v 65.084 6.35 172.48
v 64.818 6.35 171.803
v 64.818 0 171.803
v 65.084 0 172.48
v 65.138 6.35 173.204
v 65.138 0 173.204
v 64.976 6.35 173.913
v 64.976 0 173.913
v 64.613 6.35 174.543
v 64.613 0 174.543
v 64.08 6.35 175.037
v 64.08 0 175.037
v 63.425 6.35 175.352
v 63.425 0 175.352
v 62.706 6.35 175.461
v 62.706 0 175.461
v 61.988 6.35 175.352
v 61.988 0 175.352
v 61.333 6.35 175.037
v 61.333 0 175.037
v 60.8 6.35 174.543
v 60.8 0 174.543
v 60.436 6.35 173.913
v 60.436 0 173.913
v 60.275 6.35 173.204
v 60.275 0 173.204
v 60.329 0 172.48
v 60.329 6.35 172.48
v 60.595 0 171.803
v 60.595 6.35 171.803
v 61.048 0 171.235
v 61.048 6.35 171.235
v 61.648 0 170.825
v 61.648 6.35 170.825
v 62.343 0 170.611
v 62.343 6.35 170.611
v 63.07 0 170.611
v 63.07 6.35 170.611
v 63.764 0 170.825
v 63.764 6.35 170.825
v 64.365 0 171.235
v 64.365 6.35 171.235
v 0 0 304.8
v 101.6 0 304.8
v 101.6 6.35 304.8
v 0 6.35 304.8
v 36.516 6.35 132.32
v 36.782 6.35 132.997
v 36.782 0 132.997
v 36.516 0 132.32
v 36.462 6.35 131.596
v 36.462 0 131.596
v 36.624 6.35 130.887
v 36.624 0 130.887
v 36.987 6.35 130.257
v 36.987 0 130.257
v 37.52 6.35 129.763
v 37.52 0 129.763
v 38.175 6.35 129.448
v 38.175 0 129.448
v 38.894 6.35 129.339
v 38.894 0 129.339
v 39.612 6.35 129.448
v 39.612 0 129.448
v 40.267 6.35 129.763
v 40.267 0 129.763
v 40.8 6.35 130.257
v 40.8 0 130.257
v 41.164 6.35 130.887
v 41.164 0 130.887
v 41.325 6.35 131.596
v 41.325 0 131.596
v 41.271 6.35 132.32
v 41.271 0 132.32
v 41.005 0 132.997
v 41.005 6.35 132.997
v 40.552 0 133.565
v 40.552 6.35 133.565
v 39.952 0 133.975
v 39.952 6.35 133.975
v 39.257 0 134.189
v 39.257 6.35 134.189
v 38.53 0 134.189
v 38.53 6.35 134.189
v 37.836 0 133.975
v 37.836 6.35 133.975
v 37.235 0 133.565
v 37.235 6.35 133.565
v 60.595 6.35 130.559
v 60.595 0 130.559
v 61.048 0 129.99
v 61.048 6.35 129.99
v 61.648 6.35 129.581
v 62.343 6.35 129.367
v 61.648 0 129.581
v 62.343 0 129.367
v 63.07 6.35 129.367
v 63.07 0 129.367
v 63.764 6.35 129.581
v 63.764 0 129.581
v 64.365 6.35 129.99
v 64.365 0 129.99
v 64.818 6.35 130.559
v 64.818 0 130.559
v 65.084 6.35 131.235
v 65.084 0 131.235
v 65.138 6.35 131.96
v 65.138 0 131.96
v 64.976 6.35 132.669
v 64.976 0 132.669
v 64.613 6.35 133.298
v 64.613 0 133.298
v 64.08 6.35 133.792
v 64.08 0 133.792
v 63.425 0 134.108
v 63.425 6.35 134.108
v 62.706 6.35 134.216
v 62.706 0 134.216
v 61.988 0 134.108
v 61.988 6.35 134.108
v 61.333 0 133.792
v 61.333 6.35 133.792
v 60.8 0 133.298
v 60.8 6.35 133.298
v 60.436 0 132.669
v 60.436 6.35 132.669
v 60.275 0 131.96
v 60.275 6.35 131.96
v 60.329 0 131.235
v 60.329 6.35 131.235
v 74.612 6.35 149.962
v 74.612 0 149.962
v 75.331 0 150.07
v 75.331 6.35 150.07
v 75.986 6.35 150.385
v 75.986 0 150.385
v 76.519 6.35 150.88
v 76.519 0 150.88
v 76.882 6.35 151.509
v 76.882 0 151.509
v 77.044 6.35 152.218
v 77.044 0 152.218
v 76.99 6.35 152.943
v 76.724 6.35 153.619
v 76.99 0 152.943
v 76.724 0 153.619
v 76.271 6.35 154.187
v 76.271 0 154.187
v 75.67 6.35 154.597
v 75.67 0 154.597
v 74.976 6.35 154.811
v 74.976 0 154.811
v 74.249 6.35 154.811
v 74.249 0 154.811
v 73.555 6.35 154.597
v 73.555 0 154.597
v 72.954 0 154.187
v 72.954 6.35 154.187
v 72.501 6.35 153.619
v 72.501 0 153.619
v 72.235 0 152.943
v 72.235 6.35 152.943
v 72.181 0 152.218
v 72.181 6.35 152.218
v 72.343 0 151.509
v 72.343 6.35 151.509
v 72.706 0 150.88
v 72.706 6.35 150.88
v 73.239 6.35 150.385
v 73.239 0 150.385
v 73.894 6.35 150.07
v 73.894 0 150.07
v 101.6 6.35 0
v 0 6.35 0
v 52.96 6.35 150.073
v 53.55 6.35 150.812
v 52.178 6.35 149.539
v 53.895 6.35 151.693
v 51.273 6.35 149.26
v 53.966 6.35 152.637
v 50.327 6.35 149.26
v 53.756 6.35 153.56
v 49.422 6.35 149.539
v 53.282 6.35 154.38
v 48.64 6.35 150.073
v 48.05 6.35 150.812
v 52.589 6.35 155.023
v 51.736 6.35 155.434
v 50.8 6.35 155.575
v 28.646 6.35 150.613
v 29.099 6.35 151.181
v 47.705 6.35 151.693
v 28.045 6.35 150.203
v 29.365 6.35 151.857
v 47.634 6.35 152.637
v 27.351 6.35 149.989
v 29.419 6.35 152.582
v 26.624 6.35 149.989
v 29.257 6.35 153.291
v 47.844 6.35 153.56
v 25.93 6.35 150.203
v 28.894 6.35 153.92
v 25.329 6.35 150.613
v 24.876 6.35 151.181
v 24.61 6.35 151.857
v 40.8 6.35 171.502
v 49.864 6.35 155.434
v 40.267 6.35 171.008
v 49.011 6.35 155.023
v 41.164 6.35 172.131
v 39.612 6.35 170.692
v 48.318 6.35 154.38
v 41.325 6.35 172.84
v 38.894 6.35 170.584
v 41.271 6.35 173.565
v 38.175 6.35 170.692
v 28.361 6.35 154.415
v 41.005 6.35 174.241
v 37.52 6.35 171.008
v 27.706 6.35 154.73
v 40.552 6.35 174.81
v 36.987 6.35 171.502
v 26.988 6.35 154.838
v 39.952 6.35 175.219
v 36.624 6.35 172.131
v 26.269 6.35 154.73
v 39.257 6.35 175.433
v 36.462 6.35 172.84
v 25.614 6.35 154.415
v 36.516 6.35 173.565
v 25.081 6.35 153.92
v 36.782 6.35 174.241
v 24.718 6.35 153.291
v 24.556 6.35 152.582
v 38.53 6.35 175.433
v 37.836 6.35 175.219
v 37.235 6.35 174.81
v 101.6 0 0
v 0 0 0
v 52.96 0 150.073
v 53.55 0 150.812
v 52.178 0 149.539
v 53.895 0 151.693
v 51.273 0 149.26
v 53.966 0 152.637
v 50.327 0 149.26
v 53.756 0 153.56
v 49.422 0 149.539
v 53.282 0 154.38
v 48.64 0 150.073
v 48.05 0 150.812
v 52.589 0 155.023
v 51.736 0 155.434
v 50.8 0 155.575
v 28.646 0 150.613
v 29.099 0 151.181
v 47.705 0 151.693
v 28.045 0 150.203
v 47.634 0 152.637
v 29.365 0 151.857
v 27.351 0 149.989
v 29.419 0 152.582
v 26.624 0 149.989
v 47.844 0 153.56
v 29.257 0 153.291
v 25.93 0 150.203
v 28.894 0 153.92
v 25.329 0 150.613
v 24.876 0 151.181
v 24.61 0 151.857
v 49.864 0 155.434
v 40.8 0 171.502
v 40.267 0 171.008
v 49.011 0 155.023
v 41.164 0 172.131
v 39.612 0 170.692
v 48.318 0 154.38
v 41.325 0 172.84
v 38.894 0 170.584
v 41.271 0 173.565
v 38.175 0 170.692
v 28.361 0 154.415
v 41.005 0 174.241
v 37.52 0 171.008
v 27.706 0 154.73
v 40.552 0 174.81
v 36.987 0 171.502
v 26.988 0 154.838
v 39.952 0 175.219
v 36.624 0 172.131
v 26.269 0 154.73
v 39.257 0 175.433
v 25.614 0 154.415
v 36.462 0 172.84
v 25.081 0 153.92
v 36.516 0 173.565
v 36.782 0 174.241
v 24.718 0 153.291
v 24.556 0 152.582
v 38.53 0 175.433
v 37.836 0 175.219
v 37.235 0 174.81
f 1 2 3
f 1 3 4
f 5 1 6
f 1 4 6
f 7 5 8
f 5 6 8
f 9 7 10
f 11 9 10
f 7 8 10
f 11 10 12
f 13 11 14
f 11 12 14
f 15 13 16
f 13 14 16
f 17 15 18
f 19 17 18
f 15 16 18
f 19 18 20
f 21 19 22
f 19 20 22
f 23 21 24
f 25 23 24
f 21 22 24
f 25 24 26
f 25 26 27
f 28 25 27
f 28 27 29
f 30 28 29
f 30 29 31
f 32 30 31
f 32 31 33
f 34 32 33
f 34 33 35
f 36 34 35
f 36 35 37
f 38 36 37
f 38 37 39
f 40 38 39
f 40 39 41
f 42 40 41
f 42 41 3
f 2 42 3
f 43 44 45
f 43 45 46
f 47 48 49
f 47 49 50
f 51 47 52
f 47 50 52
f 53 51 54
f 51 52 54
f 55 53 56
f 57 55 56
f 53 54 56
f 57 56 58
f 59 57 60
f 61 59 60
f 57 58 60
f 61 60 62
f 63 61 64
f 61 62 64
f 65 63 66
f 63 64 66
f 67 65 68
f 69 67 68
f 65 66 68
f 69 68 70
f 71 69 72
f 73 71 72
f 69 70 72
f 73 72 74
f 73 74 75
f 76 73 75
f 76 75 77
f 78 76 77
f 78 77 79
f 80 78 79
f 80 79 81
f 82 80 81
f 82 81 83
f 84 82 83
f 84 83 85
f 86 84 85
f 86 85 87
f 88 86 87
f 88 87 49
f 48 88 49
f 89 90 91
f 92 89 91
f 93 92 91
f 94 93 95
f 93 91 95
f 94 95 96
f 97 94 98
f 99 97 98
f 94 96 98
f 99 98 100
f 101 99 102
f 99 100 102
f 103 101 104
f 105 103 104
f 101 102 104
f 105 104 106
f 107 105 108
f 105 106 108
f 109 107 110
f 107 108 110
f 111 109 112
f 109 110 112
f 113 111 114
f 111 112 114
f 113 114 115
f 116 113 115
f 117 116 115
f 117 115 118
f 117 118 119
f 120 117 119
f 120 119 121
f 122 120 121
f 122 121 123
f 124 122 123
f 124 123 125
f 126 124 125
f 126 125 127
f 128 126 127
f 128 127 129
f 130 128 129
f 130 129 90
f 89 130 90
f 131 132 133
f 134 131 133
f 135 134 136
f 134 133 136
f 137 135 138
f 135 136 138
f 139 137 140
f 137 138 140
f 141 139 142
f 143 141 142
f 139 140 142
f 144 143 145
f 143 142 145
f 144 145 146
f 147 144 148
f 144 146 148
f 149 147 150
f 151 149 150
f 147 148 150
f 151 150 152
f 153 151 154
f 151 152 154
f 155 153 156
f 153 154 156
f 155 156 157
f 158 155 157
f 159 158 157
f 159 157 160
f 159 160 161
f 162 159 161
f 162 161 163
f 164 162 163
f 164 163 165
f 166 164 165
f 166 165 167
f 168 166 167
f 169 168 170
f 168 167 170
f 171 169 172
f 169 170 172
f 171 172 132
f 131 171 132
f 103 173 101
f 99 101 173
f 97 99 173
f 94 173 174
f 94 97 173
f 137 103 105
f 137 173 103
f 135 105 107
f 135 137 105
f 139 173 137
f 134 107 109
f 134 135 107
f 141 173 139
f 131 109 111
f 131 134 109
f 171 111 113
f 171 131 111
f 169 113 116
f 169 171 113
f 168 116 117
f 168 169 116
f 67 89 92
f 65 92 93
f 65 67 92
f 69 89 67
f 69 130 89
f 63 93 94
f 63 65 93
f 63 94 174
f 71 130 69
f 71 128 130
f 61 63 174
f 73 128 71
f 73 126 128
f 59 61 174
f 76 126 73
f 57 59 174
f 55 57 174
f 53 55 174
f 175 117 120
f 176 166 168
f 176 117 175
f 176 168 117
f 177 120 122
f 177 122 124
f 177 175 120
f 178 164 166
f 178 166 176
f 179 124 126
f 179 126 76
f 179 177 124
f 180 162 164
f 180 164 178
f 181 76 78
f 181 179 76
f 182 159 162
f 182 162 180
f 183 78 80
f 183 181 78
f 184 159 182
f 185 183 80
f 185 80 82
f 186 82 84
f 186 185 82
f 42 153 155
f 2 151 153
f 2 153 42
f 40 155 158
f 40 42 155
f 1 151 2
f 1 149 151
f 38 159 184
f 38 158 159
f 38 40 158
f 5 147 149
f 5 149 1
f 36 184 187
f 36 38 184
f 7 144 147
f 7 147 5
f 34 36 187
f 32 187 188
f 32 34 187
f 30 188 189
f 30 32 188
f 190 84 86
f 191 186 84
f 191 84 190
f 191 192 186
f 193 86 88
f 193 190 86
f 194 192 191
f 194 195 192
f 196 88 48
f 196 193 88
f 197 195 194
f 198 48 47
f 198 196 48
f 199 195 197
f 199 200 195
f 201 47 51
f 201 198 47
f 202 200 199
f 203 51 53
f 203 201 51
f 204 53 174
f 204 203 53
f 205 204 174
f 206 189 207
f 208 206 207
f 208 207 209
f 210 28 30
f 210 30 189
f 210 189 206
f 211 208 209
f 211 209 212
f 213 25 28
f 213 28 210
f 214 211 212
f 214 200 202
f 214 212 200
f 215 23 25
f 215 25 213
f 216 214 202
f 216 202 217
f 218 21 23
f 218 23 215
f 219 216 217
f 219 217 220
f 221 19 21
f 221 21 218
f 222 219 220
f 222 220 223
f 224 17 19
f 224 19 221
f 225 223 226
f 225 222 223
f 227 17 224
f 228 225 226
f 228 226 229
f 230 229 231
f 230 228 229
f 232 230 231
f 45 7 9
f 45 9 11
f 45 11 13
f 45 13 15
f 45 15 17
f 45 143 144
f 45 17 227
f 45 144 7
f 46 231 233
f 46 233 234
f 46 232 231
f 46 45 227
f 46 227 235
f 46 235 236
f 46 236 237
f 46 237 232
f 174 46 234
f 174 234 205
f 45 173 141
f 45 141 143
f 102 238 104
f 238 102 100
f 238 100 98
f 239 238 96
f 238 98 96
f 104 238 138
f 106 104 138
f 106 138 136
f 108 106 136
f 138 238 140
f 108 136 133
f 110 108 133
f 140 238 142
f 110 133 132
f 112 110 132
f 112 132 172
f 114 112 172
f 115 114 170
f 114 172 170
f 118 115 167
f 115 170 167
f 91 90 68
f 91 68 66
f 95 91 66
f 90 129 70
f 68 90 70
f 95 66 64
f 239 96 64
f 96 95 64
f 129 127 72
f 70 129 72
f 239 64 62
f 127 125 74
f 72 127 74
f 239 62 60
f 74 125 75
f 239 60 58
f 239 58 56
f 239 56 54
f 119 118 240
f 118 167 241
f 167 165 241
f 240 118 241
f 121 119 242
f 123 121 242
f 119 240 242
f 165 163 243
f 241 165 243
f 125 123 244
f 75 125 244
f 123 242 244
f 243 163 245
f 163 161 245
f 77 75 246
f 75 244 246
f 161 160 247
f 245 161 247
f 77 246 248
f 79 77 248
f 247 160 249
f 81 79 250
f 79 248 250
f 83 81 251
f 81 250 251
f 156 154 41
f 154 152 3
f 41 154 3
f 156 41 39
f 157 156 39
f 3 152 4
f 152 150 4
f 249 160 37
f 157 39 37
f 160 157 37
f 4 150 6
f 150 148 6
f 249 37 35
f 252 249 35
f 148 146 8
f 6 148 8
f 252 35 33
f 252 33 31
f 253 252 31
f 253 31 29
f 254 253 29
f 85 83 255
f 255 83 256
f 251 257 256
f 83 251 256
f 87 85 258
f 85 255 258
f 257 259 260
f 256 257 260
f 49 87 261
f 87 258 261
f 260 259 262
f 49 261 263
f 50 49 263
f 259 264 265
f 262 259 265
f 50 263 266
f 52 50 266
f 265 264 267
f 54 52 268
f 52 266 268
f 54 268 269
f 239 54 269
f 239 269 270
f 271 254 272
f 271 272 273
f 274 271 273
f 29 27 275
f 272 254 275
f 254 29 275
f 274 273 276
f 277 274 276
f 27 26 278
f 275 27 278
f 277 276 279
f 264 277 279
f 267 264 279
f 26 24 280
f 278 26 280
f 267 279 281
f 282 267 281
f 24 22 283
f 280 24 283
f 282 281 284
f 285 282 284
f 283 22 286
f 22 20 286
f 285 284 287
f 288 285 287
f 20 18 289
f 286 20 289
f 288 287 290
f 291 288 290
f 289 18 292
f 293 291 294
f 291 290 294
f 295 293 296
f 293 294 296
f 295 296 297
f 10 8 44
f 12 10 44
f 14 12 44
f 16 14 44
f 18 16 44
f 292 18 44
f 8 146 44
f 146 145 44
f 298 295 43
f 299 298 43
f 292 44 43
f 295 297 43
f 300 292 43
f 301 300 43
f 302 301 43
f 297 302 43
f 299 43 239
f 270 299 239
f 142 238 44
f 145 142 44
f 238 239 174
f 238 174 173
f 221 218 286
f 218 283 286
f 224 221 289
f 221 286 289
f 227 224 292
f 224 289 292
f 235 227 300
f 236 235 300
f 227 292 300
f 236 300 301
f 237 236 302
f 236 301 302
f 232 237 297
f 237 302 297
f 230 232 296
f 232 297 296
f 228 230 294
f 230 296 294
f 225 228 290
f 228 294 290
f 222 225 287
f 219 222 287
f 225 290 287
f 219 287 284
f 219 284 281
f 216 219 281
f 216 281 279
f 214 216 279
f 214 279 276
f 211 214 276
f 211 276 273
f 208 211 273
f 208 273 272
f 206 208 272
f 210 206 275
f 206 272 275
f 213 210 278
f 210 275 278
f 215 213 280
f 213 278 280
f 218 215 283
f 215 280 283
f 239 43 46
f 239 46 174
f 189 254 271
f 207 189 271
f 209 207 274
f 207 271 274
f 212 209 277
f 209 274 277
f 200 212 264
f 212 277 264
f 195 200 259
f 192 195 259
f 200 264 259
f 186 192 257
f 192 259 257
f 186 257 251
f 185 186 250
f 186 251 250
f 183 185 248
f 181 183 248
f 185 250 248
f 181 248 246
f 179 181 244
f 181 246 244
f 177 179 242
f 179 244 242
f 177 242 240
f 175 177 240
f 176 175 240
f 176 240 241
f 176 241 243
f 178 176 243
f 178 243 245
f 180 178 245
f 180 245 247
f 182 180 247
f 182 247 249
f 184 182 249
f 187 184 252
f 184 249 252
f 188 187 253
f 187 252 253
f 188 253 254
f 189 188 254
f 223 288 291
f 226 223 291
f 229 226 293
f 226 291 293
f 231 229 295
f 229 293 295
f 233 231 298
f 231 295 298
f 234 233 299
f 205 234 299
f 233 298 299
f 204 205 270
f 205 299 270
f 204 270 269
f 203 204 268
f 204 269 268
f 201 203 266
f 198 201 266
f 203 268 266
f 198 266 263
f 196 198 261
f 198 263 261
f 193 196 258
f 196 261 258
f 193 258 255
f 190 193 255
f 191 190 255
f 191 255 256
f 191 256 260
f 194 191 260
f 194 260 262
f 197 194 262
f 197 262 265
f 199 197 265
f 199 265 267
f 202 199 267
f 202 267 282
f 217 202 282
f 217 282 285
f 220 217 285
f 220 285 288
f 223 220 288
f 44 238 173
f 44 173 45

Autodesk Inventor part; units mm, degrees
ref_plane "YZ Plane" through (0, 0, 0) normal (1, 0, 0) x (0, 1, 0)
ref_plane "XZ Plane" through (0, 0, 0) normal (0, 1, 0) x (-1, 0, 0)
ref_plane "XY Plane" through (0, 0, 0) normal (0, 0, 1) x (1, 0, 0)
sketch "Sketch1" plane through (0, 0, 0) normal (0, 1, 0) x (-1, 0, 0)
  line L0 (0, 0) -> (-101.6, 0)
  line L1 (-101.6, 0) -> (-101.6, 304.8)
  line L2 (-101.6, 304.8) -> (0, 304.8)
  line L3 (0, 304.8) -> (0, 0)
  point P0 (-50.8, 152.4)
  dimension "d0" = 101.6
  dimension "d1" = 304.8
  dimension "d25" = 50.8
  dimension "d26" = 152.4
extrude "Extrusion1" add sketch "Sketch1" along normal blind 6.35
hole "Hole2" at (26.9875, 6.35, 152.4) direction (0, -1, 0) diameter 4.8768 end through all
hole "Hole3" at (50.8, 6.35, 152.4) direction (0, -1, 0) diameter 6.35 end through all
pattern_circular "Circular Pattern2" count 6 over 360 about axis through (50.8, -315.0002, 152.4) along (0, 1, 0) of "Hole2"
properties part number "Claw Plate"
